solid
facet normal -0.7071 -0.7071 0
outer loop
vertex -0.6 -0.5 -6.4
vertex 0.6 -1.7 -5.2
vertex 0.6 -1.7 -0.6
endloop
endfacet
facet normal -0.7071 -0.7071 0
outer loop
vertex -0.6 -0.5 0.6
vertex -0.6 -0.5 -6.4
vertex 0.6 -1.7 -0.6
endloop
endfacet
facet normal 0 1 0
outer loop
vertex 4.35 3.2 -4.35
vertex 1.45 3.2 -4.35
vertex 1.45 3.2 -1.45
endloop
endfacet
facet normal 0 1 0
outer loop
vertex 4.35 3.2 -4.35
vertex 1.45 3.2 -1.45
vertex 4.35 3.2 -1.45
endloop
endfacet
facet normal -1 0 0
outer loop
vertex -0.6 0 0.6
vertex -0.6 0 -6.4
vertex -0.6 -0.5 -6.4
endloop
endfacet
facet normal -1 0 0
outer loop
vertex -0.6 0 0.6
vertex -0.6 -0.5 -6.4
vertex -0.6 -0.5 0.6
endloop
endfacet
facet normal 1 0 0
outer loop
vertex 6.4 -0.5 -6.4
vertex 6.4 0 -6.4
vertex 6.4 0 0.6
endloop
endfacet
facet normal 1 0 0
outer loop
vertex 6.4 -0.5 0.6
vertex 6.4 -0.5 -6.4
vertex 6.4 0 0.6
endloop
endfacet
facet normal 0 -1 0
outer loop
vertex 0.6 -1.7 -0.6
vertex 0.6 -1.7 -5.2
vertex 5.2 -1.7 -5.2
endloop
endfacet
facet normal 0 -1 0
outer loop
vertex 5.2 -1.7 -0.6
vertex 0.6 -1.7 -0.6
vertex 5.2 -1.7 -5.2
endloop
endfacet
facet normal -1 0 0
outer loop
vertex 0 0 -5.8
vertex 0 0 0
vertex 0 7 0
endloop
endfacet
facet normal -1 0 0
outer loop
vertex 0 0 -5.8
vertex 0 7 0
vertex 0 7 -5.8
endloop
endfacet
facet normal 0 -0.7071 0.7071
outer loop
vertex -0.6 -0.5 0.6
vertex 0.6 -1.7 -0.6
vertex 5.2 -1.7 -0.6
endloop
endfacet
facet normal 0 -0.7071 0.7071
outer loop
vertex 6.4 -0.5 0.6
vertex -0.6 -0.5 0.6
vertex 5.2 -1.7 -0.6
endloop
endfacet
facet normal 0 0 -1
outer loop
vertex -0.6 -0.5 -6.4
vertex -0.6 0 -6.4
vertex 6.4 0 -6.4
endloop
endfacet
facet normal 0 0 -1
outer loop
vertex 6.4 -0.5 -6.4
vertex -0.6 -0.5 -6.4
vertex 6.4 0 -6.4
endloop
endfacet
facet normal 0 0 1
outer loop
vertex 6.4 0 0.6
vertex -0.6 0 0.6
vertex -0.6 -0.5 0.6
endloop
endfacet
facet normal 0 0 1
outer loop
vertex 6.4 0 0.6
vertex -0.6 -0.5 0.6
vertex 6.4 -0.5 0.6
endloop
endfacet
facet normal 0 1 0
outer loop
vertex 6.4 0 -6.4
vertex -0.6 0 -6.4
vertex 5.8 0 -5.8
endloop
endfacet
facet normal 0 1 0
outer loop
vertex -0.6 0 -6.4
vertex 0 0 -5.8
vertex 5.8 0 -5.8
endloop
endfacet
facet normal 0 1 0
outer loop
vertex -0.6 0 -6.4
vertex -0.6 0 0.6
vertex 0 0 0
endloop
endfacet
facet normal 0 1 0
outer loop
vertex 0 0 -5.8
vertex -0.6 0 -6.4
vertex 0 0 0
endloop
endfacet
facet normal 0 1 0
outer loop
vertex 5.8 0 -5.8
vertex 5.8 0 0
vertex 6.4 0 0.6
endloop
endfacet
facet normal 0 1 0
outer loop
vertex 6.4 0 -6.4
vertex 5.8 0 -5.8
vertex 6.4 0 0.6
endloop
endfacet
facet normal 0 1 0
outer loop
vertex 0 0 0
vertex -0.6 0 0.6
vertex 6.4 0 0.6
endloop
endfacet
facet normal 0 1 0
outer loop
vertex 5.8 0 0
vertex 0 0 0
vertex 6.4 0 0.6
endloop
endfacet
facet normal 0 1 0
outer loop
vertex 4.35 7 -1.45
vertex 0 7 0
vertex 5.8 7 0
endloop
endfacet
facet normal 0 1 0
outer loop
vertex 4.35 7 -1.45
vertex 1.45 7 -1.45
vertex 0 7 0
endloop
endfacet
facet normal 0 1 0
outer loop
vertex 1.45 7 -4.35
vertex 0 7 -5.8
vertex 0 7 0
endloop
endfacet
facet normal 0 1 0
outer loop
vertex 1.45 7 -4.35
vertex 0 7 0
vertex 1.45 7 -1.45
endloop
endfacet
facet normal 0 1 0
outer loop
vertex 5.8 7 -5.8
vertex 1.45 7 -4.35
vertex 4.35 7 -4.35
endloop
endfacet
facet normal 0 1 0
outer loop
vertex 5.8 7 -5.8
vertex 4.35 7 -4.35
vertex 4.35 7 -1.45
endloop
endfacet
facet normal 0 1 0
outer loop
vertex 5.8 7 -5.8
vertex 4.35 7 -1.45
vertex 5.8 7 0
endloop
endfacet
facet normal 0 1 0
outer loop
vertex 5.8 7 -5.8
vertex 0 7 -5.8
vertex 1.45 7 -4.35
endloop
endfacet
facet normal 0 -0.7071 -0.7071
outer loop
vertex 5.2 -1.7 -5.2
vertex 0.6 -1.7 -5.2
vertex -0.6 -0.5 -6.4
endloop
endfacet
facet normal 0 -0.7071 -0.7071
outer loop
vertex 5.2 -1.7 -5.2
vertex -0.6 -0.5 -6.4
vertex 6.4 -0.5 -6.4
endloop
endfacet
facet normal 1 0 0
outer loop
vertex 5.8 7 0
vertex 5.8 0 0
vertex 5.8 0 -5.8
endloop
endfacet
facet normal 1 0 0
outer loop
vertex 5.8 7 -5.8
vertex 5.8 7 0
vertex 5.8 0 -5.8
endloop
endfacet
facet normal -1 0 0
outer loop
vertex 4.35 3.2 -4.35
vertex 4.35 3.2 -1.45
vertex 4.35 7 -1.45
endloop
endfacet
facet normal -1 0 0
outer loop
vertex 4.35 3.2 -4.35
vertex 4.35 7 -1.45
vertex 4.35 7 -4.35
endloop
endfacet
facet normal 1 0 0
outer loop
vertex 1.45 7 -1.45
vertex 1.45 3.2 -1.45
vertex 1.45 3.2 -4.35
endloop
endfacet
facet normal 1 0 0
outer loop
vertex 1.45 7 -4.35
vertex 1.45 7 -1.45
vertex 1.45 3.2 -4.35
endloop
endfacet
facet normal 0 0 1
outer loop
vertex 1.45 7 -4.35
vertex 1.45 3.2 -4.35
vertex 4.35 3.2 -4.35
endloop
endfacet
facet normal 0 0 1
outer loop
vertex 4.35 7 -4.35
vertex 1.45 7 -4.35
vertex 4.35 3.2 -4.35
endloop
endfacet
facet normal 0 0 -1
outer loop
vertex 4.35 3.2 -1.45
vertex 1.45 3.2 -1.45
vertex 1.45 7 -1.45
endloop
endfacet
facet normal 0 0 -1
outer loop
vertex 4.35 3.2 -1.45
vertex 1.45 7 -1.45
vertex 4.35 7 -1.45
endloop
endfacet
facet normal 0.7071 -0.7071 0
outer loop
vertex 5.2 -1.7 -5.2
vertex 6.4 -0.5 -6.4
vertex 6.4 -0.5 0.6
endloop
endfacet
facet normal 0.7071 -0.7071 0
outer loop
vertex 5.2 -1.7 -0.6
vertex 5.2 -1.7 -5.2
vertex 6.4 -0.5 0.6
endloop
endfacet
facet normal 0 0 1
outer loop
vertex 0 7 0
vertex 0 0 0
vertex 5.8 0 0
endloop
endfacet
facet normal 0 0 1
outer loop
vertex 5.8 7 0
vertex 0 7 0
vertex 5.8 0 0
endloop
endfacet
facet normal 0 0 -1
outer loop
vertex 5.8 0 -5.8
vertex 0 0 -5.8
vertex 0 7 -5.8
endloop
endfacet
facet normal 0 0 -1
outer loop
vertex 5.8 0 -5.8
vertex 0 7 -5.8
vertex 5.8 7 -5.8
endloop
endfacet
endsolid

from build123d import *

# Parameters (mm, degrees)
SKETCH1_W           = 5.8
SKETCH1_H           = 5.8
BOSS_EXTRUDE1_DEPTH = 7
SKETCH3_W           = 2.9
SKETCH3_H           = 2.9
CUT_EXTRUDE1_DEPTH  = 3.8
SKETCH4_W           = 7
SKETCH4_H           = 7
BOSS_EXTRUDE2_DEPTH = 1.7
CHAMFER1_SIZE       = 1.2


with BuildPart() as part:
    # Sketch1 → Boss-Extrude1 (new body)
    with BuildSketch(Plane(origin=(0, 0, 0), x_dir=(1, 0, 0), z_dir=(0, 1, 0))):
        with Locations((2.9, 2.9)):
            Rectangle(SKETCH1_W, SKETCH1_H)
    extrude(amount=BOSS_EXTRUDE1_DEPTH)

    # Sketch3 → Cut-Extrude1 (cut)
    with BuildSketch(Plane(origin=(0, 7, 0), x_dir=(1, 0, 0), z_dir=(0, 1, 0))):
        with Locations((2.9, 2.9)):
            Rectangle(SKETCH3_W, SKETCH3_H)
    extrude(amount=-CUT_EXTRUDE1_DEPTH, mode=Mode.SUBTRACT)

    # Sketch4 → Boss-Extrude2 (add)
    with BuildSketch(Plane.XZ):
        with Locations((2.9, -2.9)):
            Rectangle(SKETCH4_W, SKETCH4_H)
    extrude(amount=BOSS_EXTRUDE2_DEPTH)

    # Chamfer1
    chamfer1_edges = [part.edges().sort_by_distance(p)[0] for p in [
        (-0.6, -1.7, -2.9),
        (2.9, -1.7, -6.4),
        (6.4, -1.7, -2.9),
        (2.9, -1.7, 0.6),
    ]]
    chamfer(chamfer1_edges, length=CHAMFER1_SIZE)


solid = part.part
